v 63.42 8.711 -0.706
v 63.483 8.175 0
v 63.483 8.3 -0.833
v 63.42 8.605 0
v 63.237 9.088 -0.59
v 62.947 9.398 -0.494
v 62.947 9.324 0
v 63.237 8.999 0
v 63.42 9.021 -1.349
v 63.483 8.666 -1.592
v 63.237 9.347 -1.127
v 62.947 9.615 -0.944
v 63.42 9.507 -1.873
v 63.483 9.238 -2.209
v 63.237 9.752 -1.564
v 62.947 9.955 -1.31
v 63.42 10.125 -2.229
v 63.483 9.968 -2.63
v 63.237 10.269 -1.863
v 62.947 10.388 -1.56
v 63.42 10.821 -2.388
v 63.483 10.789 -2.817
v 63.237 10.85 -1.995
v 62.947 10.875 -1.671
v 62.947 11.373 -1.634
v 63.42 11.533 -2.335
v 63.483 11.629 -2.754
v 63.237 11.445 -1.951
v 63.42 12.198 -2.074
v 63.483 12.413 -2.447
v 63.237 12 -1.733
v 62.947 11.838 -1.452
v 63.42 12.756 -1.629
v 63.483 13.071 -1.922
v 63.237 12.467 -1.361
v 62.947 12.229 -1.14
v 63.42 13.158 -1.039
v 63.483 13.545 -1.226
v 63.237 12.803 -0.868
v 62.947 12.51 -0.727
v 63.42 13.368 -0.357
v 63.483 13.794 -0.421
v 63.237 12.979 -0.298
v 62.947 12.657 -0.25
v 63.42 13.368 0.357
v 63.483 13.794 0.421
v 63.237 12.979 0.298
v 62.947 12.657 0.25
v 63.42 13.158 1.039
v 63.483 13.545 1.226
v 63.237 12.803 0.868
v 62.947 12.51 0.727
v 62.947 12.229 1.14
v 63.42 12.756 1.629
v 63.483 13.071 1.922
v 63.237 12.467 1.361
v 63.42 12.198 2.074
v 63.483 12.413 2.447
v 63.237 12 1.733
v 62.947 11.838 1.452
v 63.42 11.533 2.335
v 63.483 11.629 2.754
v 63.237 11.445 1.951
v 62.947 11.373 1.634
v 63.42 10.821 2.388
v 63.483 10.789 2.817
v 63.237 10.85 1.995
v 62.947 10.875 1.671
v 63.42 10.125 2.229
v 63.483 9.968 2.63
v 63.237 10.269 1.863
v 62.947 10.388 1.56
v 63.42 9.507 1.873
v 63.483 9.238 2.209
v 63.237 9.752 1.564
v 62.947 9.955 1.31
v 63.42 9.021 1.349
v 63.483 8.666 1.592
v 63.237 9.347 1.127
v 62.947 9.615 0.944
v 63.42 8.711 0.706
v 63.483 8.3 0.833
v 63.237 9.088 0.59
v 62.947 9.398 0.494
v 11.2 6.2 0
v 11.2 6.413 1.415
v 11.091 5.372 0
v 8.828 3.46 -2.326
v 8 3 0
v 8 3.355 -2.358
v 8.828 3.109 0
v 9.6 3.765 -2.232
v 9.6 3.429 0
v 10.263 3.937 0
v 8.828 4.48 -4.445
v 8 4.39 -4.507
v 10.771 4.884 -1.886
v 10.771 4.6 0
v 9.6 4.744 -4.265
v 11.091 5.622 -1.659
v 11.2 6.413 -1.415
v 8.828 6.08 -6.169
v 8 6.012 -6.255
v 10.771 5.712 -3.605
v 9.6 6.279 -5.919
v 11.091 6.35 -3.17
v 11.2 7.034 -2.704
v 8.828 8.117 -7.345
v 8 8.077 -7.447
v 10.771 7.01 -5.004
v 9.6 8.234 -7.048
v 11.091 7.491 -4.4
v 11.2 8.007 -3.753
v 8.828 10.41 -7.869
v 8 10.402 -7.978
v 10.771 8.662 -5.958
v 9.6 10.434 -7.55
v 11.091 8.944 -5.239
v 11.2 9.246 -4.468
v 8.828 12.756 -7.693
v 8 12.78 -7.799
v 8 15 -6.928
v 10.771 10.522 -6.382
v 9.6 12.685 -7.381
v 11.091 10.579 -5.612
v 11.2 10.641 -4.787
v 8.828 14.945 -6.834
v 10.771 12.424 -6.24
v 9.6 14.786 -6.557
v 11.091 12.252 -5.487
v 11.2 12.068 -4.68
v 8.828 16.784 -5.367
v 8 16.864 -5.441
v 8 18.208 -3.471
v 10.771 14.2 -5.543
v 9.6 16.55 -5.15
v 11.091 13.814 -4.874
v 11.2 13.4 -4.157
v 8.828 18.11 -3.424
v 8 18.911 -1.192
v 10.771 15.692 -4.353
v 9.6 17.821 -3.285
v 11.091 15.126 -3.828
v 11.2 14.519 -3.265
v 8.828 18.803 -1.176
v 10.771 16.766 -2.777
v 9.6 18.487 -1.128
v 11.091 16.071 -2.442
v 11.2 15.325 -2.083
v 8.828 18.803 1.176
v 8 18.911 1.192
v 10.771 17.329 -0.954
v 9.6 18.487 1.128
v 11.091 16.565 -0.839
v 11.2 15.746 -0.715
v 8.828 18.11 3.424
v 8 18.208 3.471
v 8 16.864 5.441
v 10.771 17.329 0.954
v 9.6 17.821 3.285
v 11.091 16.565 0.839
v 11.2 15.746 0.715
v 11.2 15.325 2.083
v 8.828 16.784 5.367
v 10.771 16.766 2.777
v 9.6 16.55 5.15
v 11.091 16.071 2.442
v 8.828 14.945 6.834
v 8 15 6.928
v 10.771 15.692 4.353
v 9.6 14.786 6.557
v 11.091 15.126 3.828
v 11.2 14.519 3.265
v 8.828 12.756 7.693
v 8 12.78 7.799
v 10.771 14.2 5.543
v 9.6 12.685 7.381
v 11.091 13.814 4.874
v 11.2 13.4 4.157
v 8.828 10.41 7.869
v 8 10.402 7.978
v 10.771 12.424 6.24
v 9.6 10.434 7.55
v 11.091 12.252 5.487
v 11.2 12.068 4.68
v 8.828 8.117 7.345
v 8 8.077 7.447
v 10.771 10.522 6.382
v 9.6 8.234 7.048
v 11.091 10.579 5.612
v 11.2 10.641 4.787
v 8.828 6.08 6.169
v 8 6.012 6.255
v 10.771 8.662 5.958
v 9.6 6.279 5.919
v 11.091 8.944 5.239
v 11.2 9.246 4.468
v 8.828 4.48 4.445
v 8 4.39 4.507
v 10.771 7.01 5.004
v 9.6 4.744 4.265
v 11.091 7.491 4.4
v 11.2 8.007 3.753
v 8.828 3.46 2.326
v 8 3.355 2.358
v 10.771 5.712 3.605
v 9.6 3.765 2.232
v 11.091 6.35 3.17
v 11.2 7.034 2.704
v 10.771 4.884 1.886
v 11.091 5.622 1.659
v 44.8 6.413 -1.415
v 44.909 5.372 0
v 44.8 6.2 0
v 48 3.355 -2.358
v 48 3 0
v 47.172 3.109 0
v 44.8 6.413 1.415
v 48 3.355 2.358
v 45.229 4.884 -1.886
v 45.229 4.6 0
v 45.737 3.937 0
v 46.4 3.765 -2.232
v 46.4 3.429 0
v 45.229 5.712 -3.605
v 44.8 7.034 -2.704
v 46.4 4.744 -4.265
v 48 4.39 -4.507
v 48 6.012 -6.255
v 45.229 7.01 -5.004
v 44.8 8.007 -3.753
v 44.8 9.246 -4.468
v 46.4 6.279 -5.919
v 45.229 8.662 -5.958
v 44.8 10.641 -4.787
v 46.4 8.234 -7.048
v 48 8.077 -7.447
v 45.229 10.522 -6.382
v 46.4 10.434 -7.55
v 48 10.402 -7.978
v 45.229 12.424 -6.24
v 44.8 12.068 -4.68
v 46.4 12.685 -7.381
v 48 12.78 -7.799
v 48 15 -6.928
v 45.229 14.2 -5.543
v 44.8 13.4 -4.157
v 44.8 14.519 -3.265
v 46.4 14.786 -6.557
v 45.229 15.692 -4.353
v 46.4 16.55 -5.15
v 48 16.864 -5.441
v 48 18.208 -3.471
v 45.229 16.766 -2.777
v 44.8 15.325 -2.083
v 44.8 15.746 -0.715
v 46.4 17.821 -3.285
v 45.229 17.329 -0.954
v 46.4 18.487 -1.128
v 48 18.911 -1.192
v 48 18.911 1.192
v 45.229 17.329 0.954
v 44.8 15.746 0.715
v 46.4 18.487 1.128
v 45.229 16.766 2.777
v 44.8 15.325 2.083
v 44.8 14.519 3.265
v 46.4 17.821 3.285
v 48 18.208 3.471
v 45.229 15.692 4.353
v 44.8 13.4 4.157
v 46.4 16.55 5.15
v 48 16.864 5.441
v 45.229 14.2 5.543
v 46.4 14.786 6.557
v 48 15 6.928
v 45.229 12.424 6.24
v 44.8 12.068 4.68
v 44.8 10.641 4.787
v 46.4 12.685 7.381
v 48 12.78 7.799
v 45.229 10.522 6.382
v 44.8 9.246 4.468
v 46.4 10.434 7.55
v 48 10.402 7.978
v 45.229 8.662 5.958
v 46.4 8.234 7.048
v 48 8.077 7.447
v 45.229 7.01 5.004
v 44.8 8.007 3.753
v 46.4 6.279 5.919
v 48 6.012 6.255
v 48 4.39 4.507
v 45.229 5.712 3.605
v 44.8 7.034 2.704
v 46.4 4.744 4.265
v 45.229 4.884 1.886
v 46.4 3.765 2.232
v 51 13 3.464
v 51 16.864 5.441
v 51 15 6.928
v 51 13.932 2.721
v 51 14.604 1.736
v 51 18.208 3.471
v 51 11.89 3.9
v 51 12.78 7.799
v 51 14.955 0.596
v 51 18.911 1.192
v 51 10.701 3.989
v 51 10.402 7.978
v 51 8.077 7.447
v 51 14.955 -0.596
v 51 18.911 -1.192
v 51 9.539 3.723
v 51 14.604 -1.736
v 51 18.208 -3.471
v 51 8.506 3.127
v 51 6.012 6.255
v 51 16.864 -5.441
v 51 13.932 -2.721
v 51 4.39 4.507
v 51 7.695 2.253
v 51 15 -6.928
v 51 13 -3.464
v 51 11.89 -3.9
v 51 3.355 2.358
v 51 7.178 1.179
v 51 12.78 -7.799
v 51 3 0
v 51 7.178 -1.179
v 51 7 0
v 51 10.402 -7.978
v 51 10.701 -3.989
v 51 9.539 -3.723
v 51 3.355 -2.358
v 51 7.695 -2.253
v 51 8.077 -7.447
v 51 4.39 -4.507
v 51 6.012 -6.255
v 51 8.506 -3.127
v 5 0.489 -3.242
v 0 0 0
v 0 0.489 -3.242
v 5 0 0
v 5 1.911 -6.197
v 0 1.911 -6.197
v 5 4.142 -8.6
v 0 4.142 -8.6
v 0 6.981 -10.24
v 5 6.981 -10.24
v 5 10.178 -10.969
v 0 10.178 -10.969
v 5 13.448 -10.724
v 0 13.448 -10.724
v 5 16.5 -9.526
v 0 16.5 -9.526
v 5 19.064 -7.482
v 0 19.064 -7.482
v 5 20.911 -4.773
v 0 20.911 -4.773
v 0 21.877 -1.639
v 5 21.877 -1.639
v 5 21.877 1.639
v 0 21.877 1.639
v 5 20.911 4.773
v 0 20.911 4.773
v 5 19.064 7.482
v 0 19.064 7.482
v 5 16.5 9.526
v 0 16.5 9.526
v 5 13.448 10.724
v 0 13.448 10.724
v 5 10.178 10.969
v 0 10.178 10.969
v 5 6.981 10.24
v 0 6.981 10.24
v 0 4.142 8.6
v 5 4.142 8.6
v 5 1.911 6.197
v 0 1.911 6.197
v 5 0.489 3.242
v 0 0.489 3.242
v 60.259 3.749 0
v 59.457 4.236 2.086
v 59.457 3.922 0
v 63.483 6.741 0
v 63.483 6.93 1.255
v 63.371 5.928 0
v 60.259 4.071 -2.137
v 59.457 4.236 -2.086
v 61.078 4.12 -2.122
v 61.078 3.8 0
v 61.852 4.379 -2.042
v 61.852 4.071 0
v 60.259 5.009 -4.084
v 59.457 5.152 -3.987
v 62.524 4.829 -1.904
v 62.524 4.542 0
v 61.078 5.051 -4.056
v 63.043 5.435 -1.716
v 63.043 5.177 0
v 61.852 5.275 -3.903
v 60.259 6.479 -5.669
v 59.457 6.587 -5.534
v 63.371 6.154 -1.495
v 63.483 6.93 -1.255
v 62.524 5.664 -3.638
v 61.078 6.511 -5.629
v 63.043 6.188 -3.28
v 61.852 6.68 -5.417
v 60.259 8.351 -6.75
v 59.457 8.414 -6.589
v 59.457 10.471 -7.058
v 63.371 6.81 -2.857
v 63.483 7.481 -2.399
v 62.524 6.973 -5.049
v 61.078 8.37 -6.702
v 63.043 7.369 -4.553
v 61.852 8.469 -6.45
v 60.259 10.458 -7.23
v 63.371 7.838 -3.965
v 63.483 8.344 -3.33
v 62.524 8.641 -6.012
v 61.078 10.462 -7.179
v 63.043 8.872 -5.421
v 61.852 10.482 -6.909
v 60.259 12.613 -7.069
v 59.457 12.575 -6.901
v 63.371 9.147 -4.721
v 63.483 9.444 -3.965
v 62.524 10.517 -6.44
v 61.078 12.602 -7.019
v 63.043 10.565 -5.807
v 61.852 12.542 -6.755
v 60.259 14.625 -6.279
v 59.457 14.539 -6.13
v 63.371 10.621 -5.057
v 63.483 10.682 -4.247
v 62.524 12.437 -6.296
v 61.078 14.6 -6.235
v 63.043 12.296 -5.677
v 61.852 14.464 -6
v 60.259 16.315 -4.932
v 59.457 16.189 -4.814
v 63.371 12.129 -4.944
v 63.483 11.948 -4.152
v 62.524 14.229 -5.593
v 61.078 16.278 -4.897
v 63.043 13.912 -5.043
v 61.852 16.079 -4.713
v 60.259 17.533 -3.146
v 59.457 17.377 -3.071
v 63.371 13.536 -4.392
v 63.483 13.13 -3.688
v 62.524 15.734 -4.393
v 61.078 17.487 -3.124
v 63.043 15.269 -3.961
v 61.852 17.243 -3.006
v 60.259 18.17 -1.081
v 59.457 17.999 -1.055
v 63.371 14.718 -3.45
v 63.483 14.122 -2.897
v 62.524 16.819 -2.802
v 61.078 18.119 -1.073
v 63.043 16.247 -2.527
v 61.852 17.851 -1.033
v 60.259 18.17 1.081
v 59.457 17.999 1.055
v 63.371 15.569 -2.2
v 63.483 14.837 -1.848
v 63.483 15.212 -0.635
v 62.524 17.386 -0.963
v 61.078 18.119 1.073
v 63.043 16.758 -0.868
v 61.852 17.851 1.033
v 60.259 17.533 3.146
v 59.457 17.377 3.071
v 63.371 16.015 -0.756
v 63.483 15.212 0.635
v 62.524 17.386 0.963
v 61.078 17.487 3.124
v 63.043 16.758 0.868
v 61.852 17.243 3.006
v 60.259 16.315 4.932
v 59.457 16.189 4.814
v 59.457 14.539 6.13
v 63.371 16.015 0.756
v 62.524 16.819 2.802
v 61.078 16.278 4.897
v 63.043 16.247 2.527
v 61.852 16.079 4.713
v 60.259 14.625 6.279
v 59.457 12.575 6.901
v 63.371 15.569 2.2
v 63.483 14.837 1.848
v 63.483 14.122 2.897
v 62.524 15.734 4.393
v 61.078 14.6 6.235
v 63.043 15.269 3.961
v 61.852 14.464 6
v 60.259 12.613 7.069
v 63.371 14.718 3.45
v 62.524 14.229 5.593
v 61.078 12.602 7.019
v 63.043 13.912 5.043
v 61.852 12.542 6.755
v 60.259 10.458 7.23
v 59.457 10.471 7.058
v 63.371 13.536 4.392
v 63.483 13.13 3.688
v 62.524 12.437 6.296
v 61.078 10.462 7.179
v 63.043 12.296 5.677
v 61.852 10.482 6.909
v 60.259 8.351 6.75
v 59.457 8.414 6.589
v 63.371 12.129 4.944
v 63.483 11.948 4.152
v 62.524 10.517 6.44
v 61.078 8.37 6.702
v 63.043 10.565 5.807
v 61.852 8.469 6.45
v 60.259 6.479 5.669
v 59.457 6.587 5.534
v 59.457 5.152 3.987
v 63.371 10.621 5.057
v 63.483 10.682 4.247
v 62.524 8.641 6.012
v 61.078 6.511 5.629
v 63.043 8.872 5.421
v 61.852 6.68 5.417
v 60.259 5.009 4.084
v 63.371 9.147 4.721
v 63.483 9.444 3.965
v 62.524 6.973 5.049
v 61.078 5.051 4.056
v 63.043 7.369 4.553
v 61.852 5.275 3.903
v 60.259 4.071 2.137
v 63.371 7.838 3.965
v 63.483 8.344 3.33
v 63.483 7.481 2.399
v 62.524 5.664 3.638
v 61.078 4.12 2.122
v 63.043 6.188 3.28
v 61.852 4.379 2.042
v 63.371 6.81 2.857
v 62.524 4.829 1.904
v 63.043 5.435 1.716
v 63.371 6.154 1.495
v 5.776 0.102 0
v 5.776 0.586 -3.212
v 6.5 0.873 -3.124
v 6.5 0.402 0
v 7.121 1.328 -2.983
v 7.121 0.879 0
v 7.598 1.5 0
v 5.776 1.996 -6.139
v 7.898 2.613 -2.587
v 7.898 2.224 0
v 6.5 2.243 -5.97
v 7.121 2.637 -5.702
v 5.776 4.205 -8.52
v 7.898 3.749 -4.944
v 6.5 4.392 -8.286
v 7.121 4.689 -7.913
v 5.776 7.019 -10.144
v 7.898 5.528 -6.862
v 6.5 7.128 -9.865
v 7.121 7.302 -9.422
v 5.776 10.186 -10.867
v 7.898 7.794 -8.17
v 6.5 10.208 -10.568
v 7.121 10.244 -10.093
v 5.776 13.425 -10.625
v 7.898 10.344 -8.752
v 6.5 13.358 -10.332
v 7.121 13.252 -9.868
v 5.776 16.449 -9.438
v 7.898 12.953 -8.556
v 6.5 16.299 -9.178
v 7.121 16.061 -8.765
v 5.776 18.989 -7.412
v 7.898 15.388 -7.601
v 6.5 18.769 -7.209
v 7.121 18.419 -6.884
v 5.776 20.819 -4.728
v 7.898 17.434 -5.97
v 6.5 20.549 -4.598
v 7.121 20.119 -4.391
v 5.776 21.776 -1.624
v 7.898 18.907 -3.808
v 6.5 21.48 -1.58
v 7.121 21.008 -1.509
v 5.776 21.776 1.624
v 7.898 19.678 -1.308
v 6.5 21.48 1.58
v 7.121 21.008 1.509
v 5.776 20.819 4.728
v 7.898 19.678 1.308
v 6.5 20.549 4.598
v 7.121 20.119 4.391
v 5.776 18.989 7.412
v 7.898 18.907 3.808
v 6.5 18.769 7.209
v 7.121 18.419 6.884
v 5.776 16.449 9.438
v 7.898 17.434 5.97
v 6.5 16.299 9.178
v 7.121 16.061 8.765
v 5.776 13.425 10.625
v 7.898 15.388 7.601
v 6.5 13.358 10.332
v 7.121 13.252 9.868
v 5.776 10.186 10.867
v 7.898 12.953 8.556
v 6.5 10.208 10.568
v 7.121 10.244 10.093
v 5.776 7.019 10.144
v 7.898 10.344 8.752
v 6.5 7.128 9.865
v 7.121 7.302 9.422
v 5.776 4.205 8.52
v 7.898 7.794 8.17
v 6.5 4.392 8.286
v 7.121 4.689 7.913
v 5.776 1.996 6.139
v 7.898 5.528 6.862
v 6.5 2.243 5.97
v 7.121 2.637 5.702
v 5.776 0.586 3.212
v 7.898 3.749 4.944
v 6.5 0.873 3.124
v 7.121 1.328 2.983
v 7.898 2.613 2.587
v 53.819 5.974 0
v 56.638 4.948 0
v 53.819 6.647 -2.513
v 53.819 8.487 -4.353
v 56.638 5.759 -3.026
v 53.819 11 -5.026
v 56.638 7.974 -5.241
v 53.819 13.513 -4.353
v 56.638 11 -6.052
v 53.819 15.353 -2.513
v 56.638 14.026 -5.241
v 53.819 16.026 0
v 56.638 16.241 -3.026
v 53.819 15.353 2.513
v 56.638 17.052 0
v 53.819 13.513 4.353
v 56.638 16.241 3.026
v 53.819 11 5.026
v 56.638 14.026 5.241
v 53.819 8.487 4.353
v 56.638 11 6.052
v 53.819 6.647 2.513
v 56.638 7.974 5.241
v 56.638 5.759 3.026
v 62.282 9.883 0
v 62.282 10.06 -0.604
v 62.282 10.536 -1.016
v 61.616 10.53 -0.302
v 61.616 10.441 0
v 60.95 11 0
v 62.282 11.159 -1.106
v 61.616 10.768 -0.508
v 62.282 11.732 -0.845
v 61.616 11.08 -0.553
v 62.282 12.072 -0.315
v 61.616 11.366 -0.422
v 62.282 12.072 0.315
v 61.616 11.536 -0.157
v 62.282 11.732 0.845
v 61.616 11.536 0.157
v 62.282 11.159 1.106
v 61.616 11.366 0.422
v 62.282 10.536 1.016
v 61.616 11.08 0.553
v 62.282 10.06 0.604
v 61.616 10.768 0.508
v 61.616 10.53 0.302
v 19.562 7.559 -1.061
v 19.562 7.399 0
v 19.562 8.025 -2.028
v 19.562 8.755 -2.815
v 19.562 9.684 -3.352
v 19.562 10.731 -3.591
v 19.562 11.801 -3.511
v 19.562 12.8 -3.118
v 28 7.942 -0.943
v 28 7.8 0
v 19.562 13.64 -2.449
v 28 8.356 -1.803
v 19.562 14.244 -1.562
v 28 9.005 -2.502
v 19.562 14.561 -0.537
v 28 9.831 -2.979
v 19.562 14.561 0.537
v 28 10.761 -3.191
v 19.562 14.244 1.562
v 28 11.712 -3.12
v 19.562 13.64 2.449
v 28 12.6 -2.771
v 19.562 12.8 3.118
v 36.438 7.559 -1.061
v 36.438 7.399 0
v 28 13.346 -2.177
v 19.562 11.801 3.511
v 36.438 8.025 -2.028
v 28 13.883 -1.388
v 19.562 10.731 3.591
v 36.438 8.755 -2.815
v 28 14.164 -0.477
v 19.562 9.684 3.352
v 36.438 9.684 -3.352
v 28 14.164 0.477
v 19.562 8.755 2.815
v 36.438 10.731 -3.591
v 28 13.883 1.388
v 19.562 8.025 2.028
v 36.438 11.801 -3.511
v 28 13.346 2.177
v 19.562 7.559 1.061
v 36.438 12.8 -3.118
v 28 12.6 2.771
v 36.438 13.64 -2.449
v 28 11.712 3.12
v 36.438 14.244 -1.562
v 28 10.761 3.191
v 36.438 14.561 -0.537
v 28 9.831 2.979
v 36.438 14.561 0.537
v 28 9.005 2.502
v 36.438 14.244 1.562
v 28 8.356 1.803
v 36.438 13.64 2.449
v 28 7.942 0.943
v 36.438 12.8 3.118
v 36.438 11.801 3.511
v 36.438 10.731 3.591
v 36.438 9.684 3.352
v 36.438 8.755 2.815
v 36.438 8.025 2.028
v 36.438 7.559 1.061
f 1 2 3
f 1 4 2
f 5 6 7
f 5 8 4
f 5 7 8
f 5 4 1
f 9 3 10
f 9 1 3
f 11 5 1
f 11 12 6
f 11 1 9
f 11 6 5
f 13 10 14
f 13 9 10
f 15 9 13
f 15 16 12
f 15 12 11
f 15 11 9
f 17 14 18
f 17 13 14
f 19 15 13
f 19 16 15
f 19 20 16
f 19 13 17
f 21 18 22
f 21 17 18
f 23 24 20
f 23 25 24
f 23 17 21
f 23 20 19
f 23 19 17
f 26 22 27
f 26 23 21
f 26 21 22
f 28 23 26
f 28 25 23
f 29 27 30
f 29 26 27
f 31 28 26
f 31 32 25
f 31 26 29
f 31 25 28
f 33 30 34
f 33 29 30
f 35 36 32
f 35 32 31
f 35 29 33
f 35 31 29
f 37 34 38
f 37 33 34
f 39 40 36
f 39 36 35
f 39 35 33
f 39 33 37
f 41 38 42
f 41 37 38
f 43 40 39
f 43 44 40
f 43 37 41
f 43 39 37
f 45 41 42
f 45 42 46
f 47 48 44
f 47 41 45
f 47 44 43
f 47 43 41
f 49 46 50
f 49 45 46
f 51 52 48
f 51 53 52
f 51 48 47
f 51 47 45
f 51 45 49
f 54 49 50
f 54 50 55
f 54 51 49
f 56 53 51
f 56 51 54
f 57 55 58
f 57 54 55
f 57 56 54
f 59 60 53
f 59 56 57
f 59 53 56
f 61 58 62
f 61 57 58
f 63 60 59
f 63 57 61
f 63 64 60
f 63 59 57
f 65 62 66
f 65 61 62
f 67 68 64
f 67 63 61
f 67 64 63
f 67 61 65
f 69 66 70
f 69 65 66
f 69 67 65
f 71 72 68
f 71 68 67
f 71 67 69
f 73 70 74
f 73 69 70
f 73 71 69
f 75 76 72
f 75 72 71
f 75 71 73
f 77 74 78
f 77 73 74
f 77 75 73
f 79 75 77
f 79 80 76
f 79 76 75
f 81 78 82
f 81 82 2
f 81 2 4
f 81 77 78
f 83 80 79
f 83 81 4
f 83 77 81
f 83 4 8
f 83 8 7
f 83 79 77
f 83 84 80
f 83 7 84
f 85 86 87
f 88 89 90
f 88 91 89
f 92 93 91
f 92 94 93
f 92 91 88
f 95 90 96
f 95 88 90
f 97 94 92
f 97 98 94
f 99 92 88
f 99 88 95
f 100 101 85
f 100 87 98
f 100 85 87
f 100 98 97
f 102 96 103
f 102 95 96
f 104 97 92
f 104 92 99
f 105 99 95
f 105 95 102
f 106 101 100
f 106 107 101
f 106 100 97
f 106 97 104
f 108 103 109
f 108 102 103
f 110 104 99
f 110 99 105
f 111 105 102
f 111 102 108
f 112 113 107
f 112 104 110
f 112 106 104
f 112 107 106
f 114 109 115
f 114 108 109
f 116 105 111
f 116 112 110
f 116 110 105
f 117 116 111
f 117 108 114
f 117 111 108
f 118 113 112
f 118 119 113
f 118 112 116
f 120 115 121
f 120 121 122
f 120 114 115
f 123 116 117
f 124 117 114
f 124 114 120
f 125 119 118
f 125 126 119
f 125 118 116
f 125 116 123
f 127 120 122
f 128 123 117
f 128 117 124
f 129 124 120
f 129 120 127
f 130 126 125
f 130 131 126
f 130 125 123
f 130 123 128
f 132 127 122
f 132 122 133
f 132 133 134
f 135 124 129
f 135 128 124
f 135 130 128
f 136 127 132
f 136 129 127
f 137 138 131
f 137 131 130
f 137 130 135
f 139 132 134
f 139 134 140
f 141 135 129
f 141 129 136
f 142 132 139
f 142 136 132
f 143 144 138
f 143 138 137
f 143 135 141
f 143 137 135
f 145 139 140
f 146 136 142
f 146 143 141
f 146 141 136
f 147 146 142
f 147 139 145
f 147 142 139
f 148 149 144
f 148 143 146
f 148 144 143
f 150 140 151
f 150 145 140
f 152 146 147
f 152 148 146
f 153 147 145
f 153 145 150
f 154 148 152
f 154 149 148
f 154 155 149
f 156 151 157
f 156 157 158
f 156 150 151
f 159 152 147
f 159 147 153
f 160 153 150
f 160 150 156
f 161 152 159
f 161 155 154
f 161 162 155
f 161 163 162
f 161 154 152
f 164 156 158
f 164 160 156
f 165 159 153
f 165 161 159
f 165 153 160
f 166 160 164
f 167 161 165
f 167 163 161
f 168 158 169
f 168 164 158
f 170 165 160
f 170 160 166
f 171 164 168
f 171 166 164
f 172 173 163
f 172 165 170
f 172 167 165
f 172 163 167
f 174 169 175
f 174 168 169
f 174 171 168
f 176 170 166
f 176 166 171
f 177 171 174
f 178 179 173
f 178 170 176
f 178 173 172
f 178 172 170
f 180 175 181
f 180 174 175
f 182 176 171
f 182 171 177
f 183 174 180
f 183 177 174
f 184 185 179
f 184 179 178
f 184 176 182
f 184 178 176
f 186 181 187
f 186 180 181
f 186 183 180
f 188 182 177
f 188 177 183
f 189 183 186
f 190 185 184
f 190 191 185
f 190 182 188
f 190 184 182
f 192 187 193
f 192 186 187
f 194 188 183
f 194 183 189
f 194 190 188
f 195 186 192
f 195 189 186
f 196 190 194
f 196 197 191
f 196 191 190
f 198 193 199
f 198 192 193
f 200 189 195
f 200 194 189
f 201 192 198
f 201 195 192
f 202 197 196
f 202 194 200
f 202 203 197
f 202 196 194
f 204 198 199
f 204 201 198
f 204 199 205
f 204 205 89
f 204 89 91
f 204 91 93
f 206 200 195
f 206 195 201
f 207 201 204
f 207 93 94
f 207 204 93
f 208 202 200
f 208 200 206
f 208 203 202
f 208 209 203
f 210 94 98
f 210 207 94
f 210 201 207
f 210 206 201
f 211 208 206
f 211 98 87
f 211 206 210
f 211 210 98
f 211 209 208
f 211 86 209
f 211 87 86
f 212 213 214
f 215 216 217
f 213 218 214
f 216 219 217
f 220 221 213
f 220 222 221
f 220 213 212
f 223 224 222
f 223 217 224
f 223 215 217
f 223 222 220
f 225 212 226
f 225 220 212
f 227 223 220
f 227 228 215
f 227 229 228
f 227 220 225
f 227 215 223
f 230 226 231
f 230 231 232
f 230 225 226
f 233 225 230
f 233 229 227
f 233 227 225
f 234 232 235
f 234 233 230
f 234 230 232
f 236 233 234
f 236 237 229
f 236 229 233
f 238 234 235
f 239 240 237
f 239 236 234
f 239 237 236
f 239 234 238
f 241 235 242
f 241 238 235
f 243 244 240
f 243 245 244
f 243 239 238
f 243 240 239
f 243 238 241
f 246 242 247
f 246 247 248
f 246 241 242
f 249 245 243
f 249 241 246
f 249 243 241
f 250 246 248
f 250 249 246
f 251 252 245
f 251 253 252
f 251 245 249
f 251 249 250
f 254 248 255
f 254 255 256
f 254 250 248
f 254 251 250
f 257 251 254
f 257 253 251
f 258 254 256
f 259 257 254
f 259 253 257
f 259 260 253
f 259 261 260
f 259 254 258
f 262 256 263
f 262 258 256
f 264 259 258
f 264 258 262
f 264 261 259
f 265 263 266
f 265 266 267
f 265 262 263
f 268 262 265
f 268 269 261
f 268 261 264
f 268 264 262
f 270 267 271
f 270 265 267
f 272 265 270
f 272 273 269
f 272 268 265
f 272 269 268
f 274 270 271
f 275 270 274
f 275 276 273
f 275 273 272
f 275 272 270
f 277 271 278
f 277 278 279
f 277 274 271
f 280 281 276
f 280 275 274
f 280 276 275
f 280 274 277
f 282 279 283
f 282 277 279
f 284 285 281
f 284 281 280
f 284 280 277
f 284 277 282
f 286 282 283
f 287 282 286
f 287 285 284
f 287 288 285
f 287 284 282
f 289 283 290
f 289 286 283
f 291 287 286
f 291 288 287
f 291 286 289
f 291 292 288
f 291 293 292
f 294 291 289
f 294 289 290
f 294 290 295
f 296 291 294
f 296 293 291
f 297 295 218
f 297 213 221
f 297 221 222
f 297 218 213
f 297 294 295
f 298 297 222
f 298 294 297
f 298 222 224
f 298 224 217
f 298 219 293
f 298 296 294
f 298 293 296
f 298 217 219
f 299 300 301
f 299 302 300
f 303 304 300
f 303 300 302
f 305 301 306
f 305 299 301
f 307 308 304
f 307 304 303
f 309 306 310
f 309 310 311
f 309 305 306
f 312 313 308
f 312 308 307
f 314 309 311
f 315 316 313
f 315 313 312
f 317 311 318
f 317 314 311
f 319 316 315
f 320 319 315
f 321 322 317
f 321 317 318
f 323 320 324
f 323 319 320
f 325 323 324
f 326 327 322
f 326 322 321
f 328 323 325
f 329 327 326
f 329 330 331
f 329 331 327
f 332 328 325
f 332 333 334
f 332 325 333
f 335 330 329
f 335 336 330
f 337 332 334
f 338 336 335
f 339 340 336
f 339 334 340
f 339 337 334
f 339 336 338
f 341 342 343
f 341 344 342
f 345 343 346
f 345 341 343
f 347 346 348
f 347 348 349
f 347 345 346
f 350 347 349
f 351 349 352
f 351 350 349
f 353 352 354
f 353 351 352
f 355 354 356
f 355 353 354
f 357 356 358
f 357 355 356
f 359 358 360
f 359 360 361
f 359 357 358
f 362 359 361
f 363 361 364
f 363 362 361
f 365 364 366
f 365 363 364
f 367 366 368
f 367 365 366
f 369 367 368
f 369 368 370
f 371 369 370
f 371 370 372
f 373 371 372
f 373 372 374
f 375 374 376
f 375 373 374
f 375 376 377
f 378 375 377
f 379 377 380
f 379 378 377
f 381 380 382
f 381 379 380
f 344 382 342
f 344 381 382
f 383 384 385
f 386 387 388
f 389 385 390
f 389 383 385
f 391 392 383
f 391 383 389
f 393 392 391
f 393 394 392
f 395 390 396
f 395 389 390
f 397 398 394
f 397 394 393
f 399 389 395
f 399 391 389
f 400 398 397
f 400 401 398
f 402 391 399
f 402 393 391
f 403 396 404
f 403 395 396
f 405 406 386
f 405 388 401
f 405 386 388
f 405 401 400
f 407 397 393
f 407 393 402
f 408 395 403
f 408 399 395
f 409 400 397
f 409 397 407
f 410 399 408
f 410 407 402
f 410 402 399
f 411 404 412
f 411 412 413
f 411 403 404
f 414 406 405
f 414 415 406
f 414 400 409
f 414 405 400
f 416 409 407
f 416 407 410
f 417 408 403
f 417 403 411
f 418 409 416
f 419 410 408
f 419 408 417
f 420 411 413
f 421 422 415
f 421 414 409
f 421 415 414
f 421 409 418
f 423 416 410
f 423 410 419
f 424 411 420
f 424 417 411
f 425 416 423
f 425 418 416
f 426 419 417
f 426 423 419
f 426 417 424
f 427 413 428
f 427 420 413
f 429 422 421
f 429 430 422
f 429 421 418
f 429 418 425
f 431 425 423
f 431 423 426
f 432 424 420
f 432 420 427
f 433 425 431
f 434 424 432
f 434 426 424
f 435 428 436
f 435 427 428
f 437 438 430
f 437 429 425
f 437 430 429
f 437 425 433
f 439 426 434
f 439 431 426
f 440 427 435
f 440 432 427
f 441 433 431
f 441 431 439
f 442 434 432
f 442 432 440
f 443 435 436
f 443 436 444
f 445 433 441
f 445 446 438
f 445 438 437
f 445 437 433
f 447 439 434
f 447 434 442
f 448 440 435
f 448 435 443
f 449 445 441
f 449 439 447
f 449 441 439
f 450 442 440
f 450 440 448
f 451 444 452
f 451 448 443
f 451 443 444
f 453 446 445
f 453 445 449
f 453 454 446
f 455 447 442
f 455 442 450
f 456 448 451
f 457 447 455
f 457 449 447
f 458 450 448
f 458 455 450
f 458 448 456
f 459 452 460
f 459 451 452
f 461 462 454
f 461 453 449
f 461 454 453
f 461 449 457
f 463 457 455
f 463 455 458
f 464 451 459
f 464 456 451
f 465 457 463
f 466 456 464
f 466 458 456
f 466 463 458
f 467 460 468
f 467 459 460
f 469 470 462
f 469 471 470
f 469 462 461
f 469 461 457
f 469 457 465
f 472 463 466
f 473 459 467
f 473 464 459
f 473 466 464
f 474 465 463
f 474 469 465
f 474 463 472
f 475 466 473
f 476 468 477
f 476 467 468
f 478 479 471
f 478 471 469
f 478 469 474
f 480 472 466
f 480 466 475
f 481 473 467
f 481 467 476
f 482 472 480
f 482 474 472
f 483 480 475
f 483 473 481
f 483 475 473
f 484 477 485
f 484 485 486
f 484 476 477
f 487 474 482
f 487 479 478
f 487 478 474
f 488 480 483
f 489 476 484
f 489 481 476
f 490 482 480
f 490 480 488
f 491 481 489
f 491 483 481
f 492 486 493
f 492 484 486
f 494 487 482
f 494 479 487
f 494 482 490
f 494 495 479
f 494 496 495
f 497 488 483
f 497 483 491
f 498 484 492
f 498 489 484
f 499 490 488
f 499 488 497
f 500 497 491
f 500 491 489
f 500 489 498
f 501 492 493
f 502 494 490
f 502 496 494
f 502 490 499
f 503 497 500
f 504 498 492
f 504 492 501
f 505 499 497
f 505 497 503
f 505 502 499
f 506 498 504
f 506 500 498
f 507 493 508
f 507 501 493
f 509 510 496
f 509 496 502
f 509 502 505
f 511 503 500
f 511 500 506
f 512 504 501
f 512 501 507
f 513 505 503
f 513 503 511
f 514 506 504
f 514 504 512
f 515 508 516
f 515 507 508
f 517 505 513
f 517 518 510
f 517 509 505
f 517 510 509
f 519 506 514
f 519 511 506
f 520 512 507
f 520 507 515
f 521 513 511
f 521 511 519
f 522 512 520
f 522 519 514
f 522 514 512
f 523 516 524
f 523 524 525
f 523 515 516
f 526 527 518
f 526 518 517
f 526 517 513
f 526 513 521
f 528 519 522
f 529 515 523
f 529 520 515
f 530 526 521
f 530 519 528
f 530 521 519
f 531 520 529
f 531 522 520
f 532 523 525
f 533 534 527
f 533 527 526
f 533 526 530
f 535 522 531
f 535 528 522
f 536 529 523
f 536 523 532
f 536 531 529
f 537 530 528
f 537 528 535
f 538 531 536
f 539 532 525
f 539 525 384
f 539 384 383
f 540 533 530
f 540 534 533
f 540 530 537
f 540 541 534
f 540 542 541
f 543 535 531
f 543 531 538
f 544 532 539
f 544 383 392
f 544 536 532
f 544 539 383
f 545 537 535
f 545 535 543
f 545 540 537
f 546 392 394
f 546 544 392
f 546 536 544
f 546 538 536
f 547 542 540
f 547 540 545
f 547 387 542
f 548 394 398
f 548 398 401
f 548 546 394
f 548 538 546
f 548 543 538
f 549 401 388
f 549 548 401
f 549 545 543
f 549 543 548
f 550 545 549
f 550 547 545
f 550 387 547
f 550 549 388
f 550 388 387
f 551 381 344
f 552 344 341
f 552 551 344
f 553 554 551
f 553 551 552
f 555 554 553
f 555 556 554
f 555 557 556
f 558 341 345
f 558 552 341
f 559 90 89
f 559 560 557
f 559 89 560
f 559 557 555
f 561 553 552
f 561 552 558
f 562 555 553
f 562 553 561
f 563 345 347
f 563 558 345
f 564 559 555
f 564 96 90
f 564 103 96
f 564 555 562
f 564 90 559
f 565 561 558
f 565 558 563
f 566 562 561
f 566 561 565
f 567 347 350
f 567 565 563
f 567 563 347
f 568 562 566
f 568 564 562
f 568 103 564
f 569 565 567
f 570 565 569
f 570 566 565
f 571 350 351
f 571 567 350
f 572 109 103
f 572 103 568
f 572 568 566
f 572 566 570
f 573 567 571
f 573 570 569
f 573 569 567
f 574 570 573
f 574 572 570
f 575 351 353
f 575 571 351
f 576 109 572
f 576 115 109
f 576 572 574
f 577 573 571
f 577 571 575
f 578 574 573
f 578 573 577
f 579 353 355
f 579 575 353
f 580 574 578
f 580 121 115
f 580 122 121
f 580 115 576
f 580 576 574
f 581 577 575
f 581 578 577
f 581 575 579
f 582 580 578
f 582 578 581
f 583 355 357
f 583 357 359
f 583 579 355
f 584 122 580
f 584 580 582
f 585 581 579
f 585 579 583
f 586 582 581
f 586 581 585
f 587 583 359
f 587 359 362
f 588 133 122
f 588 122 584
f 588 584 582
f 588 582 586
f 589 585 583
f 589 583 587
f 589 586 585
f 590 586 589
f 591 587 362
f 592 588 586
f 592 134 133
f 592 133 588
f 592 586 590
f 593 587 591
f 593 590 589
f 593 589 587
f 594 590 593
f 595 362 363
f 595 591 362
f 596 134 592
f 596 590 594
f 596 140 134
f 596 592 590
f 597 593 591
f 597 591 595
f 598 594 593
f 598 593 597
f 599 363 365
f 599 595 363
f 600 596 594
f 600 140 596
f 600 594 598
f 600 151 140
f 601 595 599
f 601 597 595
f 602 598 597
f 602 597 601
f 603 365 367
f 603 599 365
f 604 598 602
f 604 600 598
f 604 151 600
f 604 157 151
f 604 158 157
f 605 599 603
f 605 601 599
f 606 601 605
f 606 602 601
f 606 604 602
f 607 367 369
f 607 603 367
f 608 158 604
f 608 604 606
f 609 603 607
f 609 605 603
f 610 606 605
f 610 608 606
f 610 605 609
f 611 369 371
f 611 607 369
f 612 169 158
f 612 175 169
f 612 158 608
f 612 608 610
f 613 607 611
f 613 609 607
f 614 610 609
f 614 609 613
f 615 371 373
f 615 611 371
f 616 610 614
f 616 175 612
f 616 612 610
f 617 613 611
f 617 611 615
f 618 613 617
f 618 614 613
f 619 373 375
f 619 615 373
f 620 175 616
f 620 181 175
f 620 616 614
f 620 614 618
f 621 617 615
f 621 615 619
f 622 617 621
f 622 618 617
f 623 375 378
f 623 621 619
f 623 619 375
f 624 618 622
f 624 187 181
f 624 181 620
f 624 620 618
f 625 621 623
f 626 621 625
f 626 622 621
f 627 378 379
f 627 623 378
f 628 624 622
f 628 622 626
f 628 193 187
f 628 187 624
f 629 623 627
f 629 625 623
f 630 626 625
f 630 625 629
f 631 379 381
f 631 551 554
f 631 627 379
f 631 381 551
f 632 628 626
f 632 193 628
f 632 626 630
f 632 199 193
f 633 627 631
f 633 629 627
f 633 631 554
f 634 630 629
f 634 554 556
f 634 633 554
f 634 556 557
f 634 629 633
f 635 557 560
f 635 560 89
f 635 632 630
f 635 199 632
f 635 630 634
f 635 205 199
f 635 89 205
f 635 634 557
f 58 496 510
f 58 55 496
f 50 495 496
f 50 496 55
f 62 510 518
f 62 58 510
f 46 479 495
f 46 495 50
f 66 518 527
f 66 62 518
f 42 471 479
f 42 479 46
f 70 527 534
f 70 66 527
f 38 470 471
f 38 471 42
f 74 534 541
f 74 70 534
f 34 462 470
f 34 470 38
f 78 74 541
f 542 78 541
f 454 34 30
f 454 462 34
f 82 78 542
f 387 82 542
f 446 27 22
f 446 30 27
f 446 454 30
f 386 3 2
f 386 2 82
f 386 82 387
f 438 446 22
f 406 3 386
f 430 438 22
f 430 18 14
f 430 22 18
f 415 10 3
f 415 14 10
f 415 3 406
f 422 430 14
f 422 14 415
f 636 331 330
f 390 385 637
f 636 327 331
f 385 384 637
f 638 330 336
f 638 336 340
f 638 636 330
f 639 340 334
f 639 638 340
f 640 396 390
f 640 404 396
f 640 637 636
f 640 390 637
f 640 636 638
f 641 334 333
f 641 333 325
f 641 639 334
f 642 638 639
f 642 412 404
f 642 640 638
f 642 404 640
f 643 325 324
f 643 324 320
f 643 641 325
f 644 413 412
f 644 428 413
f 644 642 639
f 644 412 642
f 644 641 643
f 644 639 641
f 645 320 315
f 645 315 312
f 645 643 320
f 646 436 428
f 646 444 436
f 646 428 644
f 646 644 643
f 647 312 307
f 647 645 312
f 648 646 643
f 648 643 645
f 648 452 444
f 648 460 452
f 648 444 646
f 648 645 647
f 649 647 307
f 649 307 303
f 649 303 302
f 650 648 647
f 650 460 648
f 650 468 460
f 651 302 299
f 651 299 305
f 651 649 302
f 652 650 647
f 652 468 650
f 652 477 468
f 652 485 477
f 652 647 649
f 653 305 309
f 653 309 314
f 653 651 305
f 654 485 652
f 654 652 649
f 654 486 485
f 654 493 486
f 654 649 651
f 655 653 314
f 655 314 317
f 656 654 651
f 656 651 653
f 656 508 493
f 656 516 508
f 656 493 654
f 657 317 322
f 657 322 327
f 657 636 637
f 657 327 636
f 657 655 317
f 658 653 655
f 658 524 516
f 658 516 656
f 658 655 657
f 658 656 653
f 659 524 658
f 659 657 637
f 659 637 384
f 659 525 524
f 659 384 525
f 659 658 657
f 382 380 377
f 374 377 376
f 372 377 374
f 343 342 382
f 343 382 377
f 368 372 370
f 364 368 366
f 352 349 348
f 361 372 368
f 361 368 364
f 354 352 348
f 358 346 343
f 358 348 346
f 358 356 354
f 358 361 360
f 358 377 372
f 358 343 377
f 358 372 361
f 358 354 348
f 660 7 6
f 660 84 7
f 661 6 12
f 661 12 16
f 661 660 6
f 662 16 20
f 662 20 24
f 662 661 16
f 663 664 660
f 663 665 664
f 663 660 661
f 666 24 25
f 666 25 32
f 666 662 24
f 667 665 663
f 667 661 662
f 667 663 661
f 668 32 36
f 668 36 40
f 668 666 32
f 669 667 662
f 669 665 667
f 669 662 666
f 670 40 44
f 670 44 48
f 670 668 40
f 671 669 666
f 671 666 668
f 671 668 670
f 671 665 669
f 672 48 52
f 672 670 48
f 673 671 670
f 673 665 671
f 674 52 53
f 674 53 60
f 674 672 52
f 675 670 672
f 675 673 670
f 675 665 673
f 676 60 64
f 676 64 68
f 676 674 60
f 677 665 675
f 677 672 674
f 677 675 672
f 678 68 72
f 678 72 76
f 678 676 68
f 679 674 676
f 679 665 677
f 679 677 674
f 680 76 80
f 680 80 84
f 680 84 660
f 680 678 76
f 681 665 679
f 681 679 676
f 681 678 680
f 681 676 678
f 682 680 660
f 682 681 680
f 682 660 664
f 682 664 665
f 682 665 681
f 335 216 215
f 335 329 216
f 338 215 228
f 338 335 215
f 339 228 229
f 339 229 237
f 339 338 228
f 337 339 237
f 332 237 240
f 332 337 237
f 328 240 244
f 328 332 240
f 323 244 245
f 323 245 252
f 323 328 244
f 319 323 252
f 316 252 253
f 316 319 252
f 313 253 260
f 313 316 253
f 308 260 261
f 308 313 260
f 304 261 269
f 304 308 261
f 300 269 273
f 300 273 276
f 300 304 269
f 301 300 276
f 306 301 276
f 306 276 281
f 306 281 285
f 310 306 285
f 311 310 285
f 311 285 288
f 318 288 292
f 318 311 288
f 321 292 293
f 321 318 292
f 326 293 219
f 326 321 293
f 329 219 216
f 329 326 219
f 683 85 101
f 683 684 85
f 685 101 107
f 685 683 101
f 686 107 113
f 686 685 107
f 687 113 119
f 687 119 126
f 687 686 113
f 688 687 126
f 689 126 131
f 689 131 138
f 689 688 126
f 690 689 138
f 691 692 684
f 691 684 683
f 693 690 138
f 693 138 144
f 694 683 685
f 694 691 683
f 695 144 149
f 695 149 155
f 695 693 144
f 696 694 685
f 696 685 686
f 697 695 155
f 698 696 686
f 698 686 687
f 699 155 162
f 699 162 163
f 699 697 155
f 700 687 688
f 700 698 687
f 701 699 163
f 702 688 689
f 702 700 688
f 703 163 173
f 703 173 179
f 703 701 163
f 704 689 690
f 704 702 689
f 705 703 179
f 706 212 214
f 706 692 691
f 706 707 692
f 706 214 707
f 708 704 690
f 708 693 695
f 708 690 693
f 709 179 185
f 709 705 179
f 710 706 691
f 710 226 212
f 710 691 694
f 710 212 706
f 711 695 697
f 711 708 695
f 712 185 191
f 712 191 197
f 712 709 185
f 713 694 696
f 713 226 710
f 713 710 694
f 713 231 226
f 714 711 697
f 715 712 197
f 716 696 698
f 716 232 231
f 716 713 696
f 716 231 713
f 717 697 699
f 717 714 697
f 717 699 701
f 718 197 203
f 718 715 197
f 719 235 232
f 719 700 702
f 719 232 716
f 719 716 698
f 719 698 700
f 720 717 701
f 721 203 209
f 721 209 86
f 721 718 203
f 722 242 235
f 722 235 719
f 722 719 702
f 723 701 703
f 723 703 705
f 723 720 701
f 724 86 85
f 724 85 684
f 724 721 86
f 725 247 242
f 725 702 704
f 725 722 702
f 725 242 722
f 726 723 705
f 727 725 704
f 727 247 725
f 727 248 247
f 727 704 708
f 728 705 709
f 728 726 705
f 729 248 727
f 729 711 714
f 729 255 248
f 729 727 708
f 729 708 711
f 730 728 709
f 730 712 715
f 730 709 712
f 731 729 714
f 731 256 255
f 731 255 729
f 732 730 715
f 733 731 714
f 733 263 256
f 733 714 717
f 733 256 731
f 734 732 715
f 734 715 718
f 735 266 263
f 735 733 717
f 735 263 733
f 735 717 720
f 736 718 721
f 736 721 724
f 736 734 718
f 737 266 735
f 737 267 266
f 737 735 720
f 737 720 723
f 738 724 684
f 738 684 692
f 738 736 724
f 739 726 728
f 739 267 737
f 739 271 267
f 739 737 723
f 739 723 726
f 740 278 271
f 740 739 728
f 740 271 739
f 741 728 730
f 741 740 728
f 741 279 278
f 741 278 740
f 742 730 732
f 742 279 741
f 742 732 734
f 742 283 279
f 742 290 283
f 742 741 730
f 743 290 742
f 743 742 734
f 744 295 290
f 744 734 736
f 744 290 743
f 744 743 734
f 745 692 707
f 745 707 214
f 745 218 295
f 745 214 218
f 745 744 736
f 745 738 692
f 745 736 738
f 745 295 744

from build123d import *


with BuildPart() as part:
    # Эскиз1 → Повернуть1 (revolve)
    with BuildSketch(Plane.XY):
        with BuildLine():
            Line((0, 11), (0, 0))
            Line((0, 0), (5, 0))
            ThreePointArc((5, 0), (7.121320344, 0.878679656), (8, 3))
            ThreePointArc((8, 3), (10.2627417, 3.9372583), (11.2, 6.2))
            ThreePointArc((11.2, 6.2), (28, 7.8), (44.8, 6.2))
            ThreePointArc((44.8, 6.2), (45.7372583, 3.9372583), (48, 3))
            Line((48, 3), (51, 3))
            Line((51, 3), (51, 7))
            Line((51, 7), (59.457233587, 3.92181871))
            ThreePointArc((59.457233587, 3.92181871), (62.204023326, 4.28344044), (63.483294017, 6.740896572))
            Line((63.483294017, 6.740896572), (63.483294017, 8.174747022))
            ThreePointArc((63.483294017, 8.174747022), (63.342755698, 8.808674415), (62.947475432, 9.323813687))
            Line((62.947475432, 9.323813687), (60.949874371, 11))
            Line((60.949874371, 11), (0, 11))
        make_face()
    revolve(axis=Axis((0, 11, 0), (1, 0, 0)))


solid = part.part
